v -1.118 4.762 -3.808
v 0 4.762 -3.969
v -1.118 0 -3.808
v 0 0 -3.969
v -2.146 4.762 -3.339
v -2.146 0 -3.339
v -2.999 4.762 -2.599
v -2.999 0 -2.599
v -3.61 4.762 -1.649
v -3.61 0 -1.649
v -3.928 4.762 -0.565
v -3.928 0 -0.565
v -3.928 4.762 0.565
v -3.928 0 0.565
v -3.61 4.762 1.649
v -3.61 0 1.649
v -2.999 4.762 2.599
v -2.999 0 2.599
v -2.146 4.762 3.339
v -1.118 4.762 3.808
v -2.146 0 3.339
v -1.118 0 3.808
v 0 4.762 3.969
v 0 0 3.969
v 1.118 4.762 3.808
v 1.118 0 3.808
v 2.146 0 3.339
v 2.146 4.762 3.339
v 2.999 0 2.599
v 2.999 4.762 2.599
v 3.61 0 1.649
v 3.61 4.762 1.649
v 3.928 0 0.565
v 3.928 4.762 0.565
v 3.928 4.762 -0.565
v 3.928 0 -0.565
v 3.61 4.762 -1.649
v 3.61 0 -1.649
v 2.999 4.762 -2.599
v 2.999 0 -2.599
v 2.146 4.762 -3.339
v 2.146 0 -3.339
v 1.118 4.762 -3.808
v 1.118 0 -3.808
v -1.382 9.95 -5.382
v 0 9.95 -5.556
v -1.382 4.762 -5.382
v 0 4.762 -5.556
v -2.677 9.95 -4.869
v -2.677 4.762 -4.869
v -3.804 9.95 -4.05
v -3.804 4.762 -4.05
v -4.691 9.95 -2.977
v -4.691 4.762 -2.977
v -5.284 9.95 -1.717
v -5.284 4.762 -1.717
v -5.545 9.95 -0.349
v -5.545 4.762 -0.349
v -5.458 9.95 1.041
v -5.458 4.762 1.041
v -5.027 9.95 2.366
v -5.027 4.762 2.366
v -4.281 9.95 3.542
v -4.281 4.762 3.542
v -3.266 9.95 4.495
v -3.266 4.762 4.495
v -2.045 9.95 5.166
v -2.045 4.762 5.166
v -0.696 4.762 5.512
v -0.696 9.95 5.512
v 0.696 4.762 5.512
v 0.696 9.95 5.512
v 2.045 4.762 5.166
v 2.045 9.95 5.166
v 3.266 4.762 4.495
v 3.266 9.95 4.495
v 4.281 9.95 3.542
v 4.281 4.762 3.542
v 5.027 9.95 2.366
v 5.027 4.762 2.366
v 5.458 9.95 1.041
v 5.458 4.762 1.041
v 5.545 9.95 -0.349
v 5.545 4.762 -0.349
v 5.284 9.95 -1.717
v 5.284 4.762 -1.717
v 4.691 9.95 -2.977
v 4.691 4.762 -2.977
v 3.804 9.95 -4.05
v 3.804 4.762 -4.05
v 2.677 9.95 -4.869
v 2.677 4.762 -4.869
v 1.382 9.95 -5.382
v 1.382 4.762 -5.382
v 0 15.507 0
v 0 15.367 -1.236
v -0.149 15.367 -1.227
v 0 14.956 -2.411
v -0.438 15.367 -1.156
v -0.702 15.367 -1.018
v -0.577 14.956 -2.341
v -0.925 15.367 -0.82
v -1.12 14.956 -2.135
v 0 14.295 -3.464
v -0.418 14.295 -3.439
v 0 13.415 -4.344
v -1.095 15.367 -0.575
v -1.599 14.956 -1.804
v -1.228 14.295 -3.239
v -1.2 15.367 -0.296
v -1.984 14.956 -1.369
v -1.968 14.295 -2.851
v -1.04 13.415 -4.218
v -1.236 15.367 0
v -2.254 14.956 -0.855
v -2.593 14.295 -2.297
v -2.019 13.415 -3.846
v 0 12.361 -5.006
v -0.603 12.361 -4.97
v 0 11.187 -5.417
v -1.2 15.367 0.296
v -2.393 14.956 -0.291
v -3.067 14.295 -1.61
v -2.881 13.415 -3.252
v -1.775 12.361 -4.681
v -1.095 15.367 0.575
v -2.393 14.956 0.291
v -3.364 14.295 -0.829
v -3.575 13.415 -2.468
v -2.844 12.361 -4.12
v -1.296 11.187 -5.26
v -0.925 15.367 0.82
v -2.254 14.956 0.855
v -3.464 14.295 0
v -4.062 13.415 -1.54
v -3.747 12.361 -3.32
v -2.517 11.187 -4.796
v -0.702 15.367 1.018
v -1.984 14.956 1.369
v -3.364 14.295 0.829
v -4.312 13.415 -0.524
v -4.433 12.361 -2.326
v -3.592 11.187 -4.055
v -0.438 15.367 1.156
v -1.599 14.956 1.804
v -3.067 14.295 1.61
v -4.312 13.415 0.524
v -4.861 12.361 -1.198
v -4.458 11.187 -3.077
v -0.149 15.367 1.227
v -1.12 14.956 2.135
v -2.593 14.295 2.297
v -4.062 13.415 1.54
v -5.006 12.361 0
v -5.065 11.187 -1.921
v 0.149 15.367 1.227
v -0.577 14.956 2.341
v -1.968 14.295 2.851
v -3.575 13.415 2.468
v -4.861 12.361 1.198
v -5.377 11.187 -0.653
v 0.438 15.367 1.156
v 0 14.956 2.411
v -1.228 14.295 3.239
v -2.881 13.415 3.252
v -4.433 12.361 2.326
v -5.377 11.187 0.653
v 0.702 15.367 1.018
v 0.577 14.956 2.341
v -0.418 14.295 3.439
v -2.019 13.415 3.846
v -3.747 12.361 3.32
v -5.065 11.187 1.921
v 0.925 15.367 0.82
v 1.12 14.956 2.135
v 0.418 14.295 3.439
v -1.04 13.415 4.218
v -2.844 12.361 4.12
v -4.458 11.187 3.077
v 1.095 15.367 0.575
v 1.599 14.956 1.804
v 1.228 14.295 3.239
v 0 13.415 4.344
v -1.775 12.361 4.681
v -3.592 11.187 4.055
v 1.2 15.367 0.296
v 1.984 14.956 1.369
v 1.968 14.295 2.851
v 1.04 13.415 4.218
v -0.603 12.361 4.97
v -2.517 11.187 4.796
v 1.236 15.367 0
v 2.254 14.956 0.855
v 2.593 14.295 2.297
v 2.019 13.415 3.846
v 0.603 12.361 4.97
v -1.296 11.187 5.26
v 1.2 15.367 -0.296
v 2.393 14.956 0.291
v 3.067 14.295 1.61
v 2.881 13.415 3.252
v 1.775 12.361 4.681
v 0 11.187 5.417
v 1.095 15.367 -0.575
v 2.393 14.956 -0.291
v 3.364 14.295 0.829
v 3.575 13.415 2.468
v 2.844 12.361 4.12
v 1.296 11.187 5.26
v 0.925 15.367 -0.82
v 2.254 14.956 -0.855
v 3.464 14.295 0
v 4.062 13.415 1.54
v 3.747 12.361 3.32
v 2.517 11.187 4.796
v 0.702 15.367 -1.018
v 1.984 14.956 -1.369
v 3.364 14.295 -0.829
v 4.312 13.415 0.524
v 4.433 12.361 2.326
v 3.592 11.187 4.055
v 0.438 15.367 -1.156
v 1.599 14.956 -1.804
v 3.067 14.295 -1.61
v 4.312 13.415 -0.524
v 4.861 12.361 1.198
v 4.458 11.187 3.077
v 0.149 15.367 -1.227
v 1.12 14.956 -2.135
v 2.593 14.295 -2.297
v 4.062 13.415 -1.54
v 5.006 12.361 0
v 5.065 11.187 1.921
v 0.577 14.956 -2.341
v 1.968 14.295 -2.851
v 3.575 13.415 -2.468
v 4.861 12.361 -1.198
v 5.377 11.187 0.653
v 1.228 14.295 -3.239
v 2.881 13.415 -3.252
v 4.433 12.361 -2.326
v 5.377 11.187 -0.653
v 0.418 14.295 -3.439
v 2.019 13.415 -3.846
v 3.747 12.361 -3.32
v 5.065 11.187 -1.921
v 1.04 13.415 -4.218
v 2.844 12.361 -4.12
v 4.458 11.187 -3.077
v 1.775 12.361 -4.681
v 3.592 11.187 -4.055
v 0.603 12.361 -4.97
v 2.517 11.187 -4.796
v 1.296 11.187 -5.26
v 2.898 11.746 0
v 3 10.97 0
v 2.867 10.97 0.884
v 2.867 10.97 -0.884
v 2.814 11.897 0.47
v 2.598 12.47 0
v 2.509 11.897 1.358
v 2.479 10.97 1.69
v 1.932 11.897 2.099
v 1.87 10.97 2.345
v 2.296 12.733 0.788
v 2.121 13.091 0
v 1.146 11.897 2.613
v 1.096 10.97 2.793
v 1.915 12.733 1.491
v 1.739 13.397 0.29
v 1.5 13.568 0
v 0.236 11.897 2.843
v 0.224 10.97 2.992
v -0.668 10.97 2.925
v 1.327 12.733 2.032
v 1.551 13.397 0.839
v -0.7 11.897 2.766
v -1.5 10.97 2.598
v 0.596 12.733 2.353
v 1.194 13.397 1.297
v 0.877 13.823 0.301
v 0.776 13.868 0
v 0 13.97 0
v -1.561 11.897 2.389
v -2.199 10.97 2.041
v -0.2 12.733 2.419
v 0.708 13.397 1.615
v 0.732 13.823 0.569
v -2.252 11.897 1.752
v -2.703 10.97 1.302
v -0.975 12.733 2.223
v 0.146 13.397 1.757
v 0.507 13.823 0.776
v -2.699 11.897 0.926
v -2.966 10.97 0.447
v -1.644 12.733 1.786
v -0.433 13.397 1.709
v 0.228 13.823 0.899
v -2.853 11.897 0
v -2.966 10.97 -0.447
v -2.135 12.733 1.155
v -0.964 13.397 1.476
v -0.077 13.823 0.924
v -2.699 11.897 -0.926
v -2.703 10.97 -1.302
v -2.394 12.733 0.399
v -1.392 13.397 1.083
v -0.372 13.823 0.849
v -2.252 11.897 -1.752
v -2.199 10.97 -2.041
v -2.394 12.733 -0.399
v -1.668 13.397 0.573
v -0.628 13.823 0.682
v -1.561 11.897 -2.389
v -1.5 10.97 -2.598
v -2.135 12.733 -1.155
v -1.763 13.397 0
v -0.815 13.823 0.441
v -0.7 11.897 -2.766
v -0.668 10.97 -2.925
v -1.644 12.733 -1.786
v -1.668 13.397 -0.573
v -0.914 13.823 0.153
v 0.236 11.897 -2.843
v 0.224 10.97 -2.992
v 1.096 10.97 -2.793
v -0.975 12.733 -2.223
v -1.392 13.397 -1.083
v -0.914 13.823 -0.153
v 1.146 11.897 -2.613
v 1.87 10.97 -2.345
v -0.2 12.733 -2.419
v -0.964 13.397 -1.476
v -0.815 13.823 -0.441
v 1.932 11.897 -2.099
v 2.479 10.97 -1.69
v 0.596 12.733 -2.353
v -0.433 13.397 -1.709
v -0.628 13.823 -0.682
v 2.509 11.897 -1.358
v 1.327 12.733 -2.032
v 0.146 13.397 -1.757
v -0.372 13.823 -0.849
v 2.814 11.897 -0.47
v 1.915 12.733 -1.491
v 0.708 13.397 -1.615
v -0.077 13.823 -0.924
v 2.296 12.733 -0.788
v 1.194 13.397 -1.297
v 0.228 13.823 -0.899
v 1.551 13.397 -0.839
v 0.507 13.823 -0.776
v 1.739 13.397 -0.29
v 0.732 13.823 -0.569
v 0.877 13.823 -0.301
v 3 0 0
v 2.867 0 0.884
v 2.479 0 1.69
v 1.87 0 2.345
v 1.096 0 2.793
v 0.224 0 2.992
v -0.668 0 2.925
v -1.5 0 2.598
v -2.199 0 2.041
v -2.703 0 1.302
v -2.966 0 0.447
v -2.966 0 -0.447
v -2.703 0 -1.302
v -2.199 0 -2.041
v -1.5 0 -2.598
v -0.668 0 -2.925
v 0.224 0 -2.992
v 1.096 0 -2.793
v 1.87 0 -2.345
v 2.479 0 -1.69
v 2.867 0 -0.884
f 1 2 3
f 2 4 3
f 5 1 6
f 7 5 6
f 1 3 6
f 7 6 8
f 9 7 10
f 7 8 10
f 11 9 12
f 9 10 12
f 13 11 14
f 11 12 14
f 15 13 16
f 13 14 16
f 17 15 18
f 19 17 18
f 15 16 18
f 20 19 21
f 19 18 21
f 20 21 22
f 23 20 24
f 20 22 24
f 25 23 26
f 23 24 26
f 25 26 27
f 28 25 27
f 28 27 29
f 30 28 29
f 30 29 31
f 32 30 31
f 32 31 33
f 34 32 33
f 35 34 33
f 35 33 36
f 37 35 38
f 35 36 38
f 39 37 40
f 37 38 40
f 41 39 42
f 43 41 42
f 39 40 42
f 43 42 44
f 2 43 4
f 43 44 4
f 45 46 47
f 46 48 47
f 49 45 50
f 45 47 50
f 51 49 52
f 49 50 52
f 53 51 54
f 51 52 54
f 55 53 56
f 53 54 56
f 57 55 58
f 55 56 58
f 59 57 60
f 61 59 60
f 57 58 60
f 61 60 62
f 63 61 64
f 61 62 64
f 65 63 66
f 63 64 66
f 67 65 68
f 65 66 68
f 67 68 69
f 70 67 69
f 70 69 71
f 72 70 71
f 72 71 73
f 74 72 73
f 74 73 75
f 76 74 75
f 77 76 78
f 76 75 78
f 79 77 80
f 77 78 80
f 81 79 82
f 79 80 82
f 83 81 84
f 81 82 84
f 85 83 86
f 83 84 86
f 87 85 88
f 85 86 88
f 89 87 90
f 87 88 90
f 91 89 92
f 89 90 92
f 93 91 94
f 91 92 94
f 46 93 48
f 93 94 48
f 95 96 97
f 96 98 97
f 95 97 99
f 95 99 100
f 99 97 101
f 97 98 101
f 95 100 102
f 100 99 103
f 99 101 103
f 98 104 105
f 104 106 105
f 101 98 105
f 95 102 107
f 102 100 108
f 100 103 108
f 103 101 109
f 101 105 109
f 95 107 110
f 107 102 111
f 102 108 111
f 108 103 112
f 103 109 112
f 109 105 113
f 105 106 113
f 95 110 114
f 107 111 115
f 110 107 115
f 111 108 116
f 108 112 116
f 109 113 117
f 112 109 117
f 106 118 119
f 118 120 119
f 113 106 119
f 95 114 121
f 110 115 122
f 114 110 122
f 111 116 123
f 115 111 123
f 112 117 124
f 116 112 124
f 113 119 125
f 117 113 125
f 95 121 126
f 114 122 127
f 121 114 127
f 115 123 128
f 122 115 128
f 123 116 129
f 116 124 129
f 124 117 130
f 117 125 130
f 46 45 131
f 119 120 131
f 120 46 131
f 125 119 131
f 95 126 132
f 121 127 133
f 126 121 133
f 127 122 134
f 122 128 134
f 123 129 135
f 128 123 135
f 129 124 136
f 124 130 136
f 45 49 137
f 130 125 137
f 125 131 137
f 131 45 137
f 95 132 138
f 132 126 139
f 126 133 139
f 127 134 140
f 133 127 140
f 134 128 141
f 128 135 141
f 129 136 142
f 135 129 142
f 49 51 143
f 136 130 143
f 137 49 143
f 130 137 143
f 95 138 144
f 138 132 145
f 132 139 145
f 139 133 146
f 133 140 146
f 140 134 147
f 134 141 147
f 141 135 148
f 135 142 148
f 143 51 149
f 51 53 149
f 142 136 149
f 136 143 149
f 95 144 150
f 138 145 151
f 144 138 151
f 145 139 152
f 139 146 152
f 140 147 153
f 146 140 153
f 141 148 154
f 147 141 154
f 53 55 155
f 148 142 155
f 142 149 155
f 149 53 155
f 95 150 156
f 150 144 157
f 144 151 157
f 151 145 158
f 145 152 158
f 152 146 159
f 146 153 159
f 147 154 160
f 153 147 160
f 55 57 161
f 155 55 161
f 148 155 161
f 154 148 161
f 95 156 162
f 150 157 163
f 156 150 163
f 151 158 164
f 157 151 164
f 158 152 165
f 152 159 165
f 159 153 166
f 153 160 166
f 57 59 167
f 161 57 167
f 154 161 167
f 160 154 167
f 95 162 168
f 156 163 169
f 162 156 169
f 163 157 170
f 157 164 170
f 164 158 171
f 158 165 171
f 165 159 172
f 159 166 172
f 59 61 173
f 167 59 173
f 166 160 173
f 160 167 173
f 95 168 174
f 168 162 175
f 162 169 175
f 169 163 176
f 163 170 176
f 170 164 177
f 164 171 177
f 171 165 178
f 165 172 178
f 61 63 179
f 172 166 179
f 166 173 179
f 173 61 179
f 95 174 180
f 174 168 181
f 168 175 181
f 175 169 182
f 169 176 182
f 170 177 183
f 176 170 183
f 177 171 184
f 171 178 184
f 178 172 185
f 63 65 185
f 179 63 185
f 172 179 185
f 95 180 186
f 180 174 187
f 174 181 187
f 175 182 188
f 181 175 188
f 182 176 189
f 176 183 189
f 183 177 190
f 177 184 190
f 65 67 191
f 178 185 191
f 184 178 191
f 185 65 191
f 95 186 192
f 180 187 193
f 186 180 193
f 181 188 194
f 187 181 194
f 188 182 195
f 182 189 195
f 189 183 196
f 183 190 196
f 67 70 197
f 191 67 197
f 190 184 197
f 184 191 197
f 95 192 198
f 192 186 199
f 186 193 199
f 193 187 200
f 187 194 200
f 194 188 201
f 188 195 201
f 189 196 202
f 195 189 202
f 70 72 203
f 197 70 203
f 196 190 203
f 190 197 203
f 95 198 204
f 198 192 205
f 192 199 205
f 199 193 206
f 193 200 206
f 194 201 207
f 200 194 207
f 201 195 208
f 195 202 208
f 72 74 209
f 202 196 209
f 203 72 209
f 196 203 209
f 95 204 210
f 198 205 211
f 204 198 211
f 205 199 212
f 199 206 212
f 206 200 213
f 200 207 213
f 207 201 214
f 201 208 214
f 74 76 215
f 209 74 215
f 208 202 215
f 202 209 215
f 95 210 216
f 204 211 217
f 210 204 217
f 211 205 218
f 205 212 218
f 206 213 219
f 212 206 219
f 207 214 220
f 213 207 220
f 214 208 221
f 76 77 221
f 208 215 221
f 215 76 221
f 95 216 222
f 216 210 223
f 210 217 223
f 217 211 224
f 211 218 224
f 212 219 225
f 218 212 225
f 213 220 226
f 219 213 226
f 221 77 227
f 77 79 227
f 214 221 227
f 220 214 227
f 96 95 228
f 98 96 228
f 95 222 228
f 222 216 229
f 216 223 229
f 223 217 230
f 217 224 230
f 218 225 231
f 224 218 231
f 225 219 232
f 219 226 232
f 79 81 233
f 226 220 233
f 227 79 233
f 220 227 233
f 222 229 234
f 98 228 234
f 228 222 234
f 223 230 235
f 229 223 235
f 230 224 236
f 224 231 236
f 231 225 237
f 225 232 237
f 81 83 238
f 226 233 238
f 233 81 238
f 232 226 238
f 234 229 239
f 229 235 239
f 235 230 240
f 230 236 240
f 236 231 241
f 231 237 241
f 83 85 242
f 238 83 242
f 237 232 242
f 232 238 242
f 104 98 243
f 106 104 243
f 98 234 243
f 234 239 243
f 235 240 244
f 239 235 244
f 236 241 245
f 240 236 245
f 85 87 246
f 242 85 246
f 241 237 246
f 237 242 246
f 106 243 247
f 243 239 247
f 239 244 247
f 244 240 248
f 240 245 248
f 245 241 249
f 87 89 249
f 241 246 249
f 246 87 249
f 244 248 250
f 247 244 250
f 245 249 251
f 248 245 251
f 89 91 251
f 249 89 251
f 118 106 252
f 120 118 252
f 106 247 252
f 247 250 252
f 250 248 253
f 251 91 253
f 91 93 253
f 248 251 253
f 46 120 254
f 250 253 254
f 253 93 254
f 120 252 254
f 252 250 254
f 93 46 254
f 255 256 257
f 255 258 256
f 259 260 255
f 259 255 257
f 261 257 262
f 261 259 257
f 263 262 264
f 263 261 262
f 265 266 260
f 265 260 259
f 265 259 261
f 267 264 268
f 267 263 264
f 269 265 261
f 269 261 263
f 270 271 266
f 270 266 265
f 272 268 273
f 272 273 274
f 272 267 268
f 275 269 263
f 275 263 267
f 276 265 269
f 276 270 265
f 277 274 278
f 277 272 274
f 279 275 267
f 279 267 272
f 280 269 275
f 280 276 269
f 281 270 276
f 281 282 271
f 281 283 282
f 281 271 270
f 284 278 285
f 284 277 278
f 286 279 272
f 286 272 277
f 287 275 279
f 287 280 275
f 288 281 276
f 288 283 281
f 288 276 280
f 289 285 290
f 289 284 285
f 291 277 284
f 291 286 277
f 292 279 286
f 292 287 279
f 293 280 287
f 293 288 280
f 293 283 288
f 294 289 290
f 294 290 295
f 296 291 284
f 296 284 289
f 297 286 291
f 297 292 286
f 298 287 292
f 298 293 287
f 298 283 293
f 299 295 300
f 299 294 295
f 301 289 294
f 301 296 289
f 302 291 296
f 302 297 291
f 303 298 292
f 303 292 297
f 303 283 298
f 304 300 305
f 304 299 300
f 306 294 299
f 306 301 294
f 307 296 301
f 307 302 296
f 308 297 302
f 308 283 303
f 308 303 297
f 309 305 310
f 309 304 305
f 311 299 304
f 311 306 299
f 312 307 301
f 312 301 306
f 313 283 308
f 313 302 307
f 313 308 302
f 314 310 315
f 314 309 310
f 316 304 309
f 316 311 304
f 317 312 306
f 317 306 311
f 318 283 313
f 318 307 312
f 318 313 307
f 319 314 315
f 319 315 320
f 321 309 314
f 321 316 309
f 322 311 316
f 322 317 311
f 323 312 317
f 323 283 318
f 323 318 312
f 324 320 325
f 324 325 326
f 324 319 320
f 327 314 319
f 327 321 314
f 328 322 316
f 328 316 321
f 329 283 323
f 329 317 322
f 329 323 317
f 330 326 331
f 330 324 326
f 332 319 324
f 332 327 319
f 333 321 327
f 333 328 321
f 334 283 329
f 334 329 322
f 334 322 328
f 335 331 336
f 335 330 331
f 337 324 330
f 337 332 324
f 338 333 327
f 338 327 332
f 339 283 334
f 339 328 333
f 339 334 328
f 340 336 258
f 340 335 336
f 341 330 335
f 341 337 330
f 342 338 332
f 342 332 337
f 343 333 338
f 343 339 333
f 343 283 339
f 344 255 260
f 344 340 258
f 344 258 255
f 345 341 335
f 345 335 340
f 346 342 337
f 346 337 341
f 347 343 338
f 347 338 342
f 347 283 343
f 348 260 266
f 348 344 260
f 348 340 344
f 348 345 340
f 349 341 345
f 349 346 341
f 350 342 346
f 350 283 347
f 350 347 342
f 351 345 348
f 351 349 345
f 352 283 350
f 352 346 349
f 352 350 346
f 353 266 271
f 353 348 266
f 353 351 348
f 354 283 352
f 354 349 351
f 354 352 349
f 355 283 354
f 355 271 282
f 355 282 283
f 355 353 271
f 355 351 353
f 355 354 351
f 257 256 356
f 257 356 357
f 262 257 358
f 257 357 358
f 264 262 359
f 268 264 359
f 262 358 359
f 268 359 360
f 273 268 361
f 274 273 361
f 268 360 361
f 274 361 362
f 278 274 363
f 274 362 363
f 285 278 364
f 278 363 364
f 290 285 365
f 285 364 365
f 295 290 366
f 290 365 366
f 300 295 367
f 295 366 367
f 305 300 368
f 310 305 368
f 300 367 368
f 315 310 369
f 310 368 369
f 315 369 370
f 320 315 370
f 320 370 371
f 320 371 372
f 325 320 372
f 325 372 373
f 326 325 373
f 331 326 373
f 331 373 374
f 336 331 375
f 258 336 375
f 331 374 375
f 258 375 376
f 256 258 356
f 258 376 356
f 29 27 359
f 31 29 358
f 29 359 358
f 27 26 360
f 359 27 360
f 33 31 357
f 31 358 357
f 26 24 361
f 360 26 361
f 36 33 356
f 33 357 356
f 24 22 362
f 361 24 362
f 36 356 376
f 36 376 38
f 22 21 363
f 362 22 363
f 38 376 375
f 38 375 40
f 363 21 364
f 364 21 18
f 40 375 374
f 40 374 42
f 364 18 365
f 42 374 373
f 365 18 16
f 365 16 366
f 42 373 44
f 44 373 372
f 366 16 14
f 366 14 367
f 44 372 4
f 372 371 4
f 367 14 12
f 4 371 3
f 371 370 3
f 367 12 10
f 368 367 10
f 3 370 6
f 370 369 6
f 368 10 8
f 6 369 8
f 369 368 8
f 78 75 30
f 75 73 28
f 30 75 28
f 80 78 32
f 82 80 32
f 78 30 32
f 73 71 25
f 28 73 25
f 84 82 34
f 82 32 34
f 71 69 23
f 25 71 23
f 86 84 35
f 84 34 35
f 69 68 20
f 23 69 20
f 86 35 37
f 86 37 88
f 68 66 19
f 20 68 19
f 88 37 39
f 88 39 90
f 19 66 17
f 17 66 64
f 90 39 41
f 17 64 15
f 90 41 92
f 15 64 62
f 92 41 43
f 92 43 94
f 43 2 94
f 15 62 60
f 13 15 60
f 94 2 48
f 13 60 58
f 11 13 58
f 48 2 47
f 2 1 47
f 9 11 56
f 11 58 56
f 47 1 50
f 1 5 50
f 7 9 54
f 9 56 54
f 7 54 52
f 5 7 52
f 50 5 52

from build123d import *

# Parameters (mm, degrees)
SKETCH3_R          = 3
CUT_EXTRUDE1_DEPTH = 13.97
FILLET1_R          = 3


with BuildPart() as part:
    # Sketch2 → Revolve1 (revolve)
    with BuildSketch(Plane(origin=(0, 0, 0), x_dir=(0, 0, -1), z_dir=(1, 0, 0))):
        with BuildLine():
            Line((0, 0), (0, 15.5067))
            ThreePointArc((0, 15.5067), (3.928862053, 13.879312053), (5.55625, 9.95045))
            Line((5.55625, 9.95045), (5.55625, 4.7625))
            Line((5.55625, 4.7625), (3.96875, 4.7625))
            Line((3.96875, 4.7625), (3.96875, 0))
            Line((3.96875, 0), (0, 0))
        make_face()
    revolve(axis=Axis((0, 0, 0), (0, 1, 0)))

    # Sketch3 → Cut-Extrude1 (cut)
    with BuildSketch(Plane.XZ):
        Circle(SKETCH3_R)
    extrude(amount=-CUT_EXTRUDE1_DEPTH, mode=Mode.SUBTRACT)

    # Fillet1
    fillet1_edges = [part.edges().sort_by_distance(p)[0] for p in [
        (-3, 13.97, 0),
    ]]
    fillet(fillet1_edges, radius=FILLET1_R)


solid = part.part
